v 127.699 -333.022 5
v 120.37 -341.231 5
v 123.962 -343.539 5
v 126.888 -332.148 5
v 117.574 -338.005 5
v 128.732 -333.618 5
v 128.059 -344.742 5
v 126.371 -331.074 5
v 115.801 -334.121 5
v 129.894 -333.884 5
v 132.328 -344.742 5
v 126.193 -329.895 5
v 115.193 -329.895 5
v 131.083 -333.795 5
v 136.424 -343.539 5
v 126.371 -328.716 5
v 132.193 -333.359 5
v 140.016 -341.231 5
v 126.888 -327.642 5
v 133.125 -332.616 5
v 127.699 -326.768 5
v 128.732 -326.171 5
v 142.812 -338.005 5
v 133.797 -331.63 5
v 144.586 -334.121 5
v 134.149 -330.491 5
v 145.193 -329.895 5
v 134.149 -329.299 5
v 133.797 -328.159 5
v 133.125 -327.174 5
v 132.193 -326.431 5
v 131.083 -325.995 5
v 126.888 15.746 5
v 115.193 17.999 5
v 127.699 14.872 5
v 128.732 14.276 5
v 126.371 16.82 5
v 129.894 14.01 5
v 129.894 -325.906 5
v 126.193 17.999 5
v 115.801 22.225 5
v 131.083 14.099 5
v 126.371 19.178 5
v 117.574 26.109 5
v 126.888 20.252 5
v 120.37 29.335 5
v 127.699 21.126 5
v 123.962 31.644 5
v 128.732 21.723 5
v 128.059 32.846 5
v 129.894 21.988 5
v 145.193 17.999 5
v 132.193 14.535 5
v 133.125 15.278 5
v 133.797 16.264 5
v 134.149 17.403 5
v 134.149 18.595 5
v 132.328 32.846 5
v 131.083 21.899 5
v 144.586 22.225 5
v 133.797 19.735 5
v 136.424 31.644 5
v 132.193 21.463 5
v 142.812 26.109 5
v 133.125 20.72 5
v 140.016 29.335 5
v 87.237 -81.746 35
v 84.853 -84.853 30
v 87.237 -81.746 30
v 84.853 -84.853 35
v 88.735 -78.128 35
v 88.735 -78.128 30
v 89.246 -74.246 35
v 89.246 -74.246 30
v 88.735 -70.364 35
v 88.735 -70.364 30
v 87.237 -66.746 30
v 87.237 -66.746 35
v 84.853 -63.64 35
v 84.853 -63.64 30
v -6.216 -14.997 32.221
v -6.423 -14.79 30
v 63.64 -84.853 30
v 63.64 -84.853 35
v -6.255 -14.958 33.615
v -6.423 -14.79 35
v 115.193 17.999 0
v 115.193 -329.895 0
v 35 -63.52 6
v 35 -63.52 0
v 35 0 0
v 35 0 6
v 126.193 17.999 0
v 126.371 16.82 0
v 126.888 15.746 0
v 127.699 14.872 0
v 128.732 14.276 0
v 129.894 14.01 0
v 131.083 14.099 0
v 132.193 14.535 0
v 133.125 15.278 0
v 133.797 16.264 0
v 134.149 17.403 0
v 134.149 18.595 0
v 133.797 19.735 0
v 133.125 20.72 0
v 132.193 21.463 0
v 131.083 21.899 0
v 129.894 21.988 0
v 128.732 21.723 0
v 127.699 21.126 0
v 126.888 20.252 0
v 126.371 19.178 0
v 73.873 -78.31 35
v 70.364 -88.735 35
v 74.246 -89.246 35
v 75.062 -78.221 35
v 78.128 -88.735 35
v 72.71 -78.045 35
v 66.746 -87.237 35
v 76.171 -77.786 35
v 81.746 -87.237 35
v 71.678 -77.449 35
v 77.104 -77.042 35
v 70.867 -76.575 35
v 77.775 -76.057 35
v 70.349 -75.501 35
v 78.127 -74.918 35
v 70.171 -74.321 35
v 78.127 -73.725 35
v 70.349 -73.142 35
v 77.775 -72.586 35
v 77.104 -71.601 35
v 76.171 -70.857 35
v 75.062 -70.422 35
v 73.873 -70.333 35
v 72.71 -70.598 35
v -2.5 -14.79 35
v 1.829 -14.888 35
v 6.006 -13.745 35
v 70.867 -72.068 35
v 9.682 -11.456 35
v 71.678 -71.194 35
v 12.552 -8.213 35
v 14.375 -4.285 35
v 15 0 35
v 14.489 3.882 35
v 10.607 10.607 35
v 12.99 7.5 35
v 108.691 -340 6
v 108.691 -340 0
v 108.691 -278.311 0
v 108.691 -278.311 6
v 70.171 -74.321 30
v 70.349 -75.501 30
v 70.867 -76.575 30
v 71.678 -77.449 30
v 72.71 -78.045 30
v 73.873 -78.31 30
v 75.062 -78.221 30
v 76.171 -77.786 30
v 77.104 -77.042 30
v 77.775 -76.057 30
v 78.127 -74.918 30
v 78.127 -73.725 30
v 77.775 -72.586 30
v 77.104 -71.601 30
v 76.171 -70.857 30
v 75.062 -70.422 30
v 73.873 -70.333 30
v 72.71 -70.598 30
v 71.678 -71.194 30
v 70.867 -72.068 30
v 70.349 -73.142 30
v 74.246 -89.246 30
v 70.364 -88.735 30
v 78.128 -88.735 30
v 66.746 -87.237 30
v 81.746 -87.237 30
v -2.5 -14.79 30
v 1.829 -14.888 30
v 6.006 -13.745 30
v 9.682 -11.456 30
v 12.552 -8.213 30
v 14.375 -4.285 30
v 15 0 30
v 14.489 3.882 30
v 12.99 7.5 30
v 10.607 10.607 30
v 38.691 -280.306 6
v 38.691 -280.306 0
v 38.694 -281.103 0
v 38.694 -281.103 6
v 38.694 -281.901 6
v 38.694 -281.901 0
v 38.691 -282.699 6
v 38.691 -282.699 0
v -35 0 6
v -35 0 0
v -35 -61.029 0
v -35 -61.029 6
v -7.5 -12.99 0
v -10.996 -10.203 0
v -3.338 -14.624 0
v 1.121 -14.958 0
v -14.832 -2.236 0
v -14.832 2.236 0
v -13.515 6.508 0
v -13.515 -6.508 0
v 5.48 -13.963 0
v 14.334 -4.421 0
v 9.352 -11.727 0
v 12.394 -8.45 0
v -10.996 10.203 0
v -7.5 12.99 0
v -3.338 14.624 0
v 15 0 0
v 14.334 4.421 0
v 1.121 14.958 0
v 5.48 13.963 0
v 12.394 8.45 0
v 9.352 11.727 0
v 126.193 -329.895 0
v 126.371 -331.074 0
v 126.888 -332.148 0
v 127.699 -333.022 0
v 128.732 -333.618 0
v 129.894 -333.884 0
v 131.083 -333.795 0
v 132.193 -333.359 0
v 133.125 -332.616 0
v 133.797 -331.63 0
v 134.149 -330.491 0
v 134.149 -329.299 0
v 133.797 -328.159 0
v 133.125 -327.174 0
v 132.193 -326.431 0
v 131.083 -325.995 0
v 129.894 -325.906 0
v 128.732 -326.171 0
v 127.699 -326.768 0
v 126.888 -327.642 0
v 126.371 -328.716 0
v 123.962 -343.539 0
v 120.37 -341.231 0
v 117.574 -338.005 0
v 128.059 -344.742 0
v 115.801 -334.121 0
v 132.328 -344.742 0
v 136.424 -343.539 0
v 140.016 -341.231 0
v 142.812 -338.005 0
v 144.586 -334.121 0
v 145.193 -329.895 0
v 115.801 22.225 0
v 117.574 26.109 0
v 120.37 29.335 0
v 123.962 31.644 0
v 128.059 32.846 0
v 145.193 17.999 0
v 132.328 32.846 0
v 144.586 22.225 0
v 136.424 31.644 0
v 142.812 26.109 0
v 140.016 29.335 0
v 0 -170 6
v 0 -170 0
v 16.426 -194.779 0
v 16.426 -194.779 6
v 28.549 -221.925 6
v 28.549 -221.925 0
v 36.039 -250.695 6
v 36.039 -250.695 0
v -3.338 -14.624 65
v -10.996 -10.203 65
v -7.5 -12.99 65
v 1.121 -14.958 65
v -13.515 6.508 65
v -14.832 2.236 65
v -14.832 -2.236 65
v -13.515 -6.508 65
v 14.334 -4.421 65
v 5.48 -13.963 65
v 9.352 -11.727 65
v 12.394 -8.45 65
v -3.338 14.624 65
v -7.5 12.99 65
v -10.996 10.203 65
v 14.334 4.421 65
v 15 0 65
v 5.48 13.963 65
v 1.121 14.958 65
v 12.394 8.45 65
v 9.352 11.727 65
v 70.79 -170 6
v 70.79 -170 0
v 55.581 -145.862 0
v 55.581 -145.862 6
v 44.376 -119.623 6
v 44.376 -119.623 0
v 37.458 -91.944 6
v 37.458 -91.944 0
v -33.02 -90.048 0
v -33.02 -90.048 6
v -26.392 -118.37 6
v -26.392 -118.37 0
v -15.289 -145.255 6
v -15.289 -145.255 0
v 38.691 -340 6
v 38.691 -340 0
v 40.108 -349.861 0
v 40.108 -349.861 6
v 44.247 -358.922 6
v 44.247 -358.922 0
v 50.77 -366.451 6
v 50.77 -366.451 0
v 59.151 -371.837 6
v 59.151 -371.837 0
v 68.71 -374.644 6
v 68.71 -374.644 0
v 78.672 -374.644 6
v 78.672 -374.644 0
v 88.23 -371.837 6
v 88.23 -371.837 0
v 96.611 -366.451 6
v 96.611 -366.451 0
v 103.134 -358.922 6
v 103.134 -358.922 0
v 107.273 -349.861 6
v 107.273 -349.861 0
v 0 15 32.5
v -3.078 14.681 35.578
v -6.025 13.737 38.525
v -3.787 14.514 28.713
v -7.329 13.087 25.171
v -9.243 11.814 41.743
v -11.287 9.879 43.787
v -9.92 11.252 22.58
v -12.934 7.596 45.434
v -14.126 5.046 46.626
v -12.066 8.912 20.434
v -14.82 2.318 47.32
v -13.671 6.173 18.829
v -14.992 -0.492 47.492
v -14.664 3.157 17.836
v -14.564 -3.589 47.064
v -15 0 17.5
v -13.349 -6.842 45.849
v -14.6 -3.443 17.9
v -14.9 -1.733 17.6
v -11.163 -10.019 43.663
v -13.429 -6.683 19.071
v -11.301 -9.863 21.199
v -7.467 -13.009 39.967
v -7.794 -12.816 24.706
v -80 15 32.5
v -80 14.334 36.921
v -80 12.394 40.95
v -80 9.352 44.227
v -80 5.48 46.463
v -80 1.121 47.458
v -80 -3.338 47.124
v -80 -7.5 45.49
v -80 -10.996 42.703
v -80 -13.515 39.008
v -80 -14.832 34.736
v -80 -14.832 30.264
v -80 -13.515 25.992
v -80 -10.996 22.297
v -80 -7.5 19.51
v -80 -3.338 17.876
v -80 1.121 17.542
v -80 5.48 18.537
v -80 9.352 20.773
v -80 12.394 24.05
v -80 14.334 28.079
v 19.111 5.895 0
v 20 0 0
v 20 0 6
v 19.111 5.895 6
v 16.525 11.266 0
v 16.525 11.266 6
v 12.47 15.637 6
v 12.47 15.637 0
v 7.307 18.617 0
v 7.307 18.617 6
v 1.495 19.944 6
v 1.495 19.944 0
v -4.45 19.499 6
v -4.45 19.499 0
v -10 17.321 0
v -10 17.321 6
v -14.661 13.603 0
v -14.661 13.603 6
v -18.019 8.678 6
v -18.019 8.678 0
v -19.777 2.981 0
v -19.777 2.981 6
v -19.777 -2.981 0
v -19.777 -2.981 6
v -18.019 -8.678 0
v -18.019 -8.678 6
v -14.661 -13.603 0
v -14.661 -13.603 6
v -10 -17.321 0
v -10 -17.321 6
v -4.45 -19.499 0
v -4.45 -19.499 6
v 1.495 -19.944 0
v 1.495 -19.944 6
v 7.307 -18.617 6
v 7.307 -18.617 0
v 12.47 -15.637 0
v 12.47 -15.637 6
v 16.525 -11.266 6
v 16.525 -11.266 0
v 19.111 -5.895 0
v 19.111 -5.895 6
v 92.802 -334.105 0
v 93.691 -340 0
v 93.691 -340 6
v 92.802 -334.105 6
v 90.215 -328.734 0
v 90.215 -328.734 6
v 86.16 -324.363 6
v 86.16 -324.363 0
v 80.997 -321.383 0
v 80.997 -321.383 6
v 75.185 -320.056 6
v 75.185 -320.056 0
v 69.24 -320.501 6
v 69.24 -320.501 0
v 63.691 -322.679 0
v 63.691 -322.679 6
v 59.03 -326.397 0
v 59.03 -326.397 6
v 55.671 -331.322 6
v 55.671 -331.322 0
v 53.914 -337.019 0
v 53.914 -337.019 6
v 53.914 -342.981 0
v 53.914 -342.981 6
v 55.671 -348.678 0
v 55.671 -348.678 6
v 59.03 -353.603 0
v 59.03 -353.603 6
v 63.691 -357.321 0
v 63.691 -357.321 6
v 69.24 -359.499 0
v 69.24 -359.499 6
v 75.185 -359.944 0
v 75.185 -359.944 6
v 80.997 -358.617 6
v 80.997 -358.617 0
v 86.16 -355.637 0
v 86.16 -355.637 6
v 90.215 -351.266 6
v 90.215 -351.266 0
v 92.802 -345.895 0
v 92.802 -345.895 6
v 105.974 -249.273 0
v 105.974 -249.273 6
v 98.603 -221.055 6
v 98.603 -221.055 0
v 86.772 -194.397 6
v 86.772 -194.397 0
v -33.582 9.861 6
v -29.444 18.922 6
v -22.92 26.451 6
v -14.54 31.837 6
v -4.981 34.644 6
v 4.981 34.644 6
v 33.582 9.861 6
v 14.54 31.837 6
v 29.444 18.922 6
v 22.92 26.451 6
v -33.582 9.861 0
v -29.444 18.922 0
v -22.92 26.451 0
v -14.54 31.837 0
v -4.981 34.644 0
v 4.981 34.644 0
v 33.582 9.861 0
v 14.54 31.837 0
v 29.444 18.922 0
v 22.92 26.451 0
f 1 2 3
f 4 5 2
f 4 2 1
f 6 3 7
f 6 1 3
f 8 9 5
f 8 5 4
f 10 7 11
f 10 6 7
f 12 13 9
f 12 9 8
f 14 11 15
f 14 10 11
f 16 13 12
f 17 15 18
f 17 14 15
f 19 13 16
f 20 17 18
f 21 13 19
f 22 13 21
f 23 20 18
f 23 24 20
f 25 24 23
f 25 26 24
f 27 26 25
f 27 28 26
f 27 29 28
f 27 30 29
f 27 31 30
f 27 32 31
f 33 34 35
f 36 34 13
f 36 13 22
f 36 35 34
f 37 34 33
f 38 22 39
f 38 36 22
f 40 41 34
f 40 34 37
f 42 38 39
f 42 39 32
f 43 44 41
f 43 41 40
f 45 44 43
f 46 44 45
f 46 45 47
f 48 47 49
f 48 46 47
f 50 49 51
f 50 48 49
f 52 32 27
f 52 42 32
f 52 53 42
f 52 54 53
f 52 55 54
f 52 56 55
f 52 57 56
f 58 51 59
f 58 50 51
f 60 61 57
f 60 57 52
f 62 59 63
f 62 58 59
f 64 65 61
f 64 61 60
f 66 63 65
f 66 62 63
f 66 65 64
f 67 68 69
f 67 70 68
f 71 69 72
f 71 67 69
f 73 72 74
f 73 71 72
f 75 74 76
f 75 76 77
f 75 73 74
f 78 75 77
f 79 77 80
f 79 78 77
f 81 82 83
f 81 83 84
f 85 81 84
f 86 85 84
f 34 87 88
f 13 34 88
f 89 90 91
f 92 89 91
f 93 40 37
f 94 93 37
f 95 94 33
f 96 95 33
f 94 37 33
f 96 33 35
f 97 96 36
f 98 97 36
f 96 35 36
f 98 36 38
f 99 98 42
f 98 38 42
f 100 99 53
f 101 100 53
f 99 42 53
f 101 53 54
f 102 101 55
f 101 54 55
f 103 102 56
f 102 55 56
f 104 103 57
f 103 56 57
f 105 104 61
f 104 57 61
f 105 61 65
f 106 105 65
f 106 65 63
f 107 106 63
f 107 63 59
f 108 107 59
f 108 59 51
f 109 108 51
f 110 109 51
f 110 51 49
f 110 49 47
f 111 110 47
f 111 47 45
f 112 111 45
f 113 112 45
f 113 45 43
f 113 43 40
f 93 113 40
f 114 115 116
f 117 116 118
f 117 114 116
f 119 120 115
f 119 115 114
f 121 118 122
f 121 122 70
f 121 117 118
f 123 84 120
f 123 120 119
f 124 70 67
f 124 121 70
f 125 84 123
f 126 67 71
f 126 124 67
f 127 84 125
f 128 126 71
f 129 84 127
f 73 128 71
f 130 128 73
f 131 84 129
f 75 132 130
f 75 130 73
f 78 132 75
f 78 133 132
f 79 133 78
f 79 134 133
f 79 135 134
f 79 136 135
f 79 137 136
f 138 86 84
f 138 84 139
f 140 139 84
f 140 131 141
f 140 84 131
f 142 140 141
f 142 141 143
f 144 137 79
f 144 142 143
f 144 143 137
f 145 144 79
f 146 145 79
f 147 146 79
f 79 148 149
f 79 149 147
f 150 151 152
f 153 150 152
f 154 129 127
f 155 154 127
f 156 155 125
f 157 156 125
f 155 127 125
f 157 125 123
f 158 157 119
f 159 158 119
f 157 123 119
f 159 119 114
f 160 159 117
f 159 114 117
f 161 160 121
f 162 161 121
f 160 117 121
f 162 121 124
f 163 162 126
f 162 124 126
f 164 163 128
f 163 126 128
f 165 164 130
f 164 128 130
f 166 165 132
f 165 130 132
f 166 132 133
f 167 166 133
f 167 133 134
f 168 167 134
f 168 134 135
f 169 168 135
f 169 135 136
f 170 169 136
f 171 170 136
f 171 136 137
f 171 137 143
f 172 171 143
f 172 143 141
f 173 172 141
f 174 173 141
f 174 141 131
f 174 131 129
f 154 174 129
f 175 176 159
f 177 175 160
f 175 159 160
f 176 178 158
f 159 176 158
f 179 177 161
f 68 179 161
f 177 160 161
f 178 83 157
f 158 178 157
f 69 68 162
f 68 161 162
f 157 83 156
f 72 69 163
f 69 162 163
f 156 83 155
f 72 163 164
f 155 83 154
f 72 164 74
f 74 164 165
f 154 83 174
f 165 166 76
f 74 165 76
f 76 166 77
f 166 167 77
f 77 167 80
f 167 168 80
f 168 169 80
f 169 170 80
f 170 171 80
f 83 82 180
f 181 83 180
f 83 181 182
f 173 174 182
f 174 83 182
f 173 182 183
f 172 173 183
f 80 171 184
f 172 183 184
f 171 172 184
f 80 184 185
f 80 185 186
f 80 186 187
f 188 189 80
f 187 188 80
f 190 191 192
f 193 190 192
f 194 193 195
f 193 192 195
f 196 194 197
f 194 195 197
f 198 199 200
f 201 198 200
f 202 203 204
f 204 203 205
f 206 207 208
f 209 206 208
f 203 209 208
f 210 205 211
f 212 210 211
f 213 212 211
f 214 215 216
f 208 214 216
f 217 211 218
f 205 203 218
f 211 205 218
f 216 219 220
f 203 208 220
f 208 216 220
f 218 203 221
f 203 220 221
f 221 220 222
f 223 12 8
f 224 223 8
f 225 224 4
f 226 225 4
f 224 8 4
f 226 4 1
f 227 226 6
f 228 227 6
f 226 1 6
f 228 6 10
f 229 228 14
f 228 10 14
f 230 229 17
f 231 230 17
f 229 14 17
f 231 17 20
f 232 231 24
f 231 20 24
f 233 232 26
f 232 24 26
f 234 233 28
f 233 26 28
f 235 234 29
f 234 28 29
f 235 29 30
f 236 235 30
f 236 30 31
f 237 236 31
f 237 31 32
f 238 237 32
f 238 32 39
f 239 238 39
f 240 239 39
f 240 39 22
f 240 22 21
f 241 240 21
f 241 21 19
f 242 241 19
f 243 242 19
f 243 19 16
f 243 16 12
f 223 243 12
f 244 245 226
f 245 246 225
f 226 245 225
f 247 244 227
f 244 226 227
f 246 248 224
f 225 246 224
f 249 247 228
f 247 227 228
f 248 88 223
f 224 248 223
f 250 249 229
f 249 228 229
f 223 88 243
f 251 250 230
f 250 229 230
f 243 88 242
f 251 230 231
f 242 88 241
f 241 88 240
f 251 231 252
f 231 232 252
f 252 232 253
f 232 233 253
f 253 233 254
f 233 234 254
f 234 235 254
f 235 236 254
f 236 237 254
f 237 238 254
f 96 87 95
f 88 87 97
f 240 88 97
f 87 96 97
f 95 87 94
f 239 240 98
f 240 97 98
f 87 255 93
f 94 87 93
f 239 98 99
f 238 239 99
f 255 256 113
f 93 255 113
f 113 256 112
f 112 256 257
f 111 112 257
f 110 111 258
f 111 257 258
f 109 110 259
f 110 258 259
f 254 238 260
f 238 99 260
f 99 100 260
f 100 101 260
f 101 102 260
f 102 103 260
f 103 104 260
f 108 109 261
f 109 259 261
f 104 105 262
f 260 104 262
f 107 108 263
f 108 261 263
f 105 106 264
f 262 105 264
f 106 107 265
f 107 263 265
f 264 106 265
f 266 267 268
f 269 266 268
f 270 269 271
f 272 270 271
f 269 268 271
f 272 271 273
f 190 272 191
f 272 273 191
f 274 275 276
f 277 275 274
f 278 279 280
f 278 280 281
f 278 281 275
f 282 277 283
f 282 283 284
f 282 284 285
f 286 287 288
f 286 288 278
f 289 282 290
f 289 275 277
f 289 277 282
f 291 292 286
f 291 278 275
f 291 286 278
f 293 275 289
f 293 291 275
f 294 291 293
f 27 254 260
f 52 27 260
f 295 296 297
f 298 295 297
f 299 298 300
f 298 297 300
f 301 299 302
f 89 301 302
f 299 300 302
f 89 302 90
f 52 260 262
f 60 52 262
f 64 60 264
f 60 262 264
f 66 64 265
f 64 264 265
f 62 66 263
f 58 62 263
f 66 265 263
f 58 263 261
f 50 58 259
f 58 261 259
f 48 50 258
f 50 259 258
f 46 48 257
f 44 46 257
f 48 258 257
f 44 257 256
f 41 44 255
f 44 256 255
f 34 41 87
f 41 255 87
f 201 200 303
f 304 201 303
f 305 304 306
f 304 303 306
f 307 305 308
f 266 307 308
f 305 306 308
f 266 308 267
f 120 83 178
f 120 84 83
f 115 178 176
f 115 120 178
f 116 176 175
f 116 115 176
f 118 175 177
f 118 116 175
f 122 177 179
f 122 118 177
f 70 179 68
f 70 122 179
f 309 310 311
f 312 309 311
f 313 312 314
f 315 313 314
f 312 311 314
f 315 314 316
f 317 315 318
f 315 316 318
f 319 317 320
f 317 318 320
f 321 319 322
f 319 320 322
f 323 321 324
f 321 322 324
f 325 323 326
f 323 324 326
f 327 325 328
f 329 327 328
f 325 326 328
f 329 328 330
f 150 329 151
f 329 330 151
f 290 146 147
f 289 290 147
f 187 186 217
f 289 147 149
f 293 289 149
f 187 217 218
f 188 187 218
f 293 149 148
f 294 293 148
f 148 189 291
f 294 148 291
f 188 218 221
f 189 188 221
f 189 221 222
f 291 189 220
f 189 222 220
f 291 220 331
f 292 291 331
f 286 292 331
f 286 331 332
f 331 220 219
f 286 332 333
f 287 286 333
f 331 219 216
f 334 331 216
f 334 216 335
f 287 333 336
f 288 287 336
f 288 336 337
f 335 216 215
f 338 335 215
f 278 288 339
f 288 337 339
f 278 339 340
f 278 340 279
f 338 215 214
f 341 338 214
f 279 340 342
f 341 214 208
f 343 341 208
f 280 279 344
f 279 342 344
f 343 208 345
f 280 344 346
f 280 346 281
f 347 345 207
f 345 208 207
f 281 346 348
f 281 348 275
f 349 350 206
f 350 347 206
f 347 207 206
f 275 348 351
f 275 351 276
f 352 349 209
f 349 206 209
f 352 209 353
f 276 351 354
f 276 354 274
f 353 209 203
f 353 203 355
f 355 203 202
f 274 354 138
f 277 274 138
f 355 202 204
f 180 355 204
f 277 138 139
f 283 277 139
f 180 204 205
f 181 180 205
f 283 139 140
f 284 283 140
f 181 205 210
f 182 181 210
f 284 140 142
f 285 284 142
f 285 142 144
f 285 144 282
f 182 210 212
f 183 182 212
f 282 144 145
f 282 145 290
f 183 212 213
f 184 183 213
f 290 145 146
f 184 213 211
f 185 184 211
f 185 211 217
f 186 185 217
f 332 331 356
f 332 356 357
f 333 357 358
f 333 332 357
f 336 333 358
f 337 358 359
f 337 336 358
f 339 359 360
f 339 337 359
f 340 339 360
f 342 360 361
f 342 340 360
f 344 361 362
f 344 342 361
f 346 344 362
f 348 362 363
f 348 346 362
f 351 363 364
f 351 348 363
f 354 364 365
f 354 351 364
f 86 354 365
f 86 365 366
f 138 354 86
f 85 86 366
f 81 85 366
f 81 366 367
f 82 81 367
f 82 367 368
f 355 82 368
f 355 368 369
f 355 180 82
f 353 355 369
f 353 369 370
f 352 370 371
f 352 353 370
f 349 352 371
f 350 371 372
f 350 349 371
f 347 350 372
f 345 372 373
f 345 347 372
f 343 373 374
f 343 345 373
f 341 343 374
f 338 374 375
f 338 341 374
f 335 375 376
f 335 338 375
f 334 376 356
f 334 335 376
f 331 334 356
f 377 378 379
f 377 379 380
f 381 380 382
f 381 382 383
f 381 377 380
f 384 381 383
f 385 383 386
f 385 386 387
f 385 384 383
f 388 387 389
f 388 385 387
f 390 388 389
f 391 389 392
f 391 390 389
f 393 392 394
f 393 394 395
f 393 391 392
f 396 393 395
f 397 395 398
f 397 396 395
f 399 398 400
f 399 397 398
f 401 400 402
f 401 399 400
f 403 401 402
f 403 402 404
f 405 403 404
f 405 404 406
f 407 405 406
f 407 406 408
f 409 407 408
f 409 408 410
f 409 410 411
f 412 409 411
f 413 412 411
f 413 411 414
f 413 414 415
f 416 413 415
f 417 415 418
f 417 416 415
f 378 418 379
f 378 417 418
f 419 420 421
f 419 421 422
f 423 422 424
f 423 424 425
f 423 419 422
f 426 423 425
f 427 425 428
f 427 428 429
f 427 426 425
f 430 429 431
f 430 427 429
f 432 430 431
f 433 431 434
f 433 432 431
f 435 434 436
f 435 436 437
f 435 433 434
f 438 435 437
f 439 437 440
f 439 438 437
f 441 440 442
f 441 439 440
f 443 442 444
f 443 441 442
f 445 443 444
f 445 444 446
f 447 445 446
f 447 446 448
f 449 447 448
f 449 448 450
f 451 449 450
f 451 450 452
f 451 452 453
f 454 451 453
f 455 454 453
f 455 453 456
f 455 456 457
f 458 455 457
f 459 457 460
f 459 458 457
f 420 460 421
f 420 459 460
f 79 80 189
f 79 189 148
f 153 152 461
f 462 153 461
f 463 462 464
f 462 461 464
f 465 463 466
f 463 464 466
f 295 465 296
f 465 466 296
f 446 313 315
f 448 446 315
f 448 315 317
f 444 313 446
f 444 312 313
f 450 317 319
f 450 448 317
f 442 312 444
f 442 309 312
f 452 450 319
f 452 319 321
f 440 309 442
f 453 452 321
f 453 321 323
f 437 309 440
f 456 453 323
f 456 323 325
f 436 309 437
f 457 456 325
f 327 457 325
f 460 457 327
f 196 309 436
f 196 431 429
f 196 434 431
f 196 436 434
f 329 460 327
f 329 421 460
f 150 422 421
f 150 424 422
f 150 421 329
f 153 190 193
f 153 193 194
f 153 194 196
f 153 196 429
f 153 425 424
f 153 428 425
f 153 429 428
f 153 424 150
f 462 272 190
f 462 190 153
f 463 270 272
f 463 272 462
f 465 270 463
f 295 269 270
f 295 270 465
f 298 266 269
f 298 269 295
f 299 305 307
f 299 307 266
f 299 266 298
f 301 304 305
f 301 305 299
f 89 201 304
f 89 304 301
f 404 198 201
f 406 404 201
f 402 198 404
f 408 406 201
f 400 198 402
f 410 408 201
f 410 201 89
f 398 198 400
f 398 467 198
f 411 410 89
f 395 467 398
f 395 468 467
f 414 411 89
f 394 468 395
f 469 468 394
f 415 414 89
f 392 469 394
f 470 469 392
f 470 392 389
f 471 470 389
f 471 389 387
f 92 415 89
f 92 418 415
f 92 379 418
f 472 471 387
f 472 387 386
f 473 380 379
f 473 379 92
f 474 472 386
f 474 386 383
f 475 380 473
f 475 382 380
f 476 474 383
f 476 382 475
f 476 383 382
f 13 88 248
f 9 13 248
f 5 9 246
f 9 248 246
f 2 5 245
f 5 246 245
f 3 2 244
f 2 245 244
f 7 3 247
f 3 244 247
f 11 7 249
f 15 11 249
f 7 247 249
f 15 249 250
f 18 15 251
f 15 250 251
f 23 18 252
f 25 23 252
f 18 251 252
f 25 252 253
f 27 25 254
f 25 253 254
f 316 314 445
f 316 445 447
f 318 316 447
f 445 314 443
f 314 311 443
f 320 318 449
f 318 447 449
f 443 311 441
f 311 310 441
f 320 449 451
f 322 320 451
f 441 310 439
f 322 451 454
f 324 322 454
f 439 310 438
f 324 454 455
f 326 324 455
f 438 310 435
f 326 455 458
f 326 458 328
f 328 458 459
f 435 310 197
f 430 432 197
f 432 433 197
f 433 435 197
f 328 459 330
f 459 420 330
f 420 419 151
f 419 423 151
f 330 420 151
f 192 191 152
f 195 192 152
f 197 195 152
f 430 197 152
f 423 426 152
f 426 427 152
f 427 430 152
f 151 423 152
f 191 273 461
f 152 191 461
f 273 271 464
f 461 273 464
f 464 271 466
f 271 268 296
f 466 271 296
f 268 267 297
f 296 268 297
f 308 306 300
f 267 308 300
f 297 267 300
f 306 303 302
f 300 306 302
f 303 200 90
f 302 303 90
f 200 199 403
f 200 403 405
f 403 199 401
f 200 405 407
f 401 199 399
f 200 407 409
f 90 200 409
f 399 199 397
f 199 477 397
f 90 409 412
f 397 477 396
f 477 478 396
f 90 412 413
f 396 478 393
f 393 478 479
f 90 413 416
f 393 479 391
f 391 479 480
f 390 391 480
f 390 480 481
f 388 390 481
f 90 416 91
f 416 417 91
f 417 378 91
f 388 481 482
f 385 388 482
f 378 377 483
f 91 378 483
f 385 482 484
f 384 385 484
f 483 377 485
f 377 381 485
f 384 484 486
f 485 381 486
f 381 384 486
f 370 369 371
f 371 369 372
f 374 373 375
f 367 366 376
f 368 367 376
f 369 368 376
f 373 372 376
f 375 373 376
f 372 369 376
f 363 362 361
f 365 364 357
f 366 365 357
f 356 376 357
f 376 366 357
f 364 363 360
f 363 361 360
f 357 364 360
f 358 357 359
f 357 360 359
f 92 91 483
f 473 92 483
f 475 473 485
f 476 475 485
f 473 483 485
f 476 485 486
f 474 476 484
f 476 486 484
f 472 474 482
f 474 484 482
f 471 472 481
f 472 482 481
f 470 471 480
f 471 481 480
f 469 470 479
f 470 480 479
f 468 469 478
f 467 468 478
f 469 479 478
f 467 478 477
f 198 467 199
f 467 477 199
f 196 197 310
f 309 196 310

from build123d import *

# Parameters (mm, degrees)
F0_R      = 20
F1_DEPTH  = 6
F2_R      = 15
F3_DEPTH  = 65
F4_R      = 15
F5_DEPTH  = 80
F7_W      = 30
F7_H      = 5
F8_DEPTH  = 120
F10_D     = 8
F11_R     = 14.99999
F13_DEPTH = 5
F14_D     = 8


# Not quite as in the source:
# - a fillet or chamfer is up to 0.001 mm smaller than in the source, because OpenCascade refuses the exact size


with BuildPart() as f1:
    # F0 (on Top) → F1 (new body)
    with BuildSketch(Plane.XY):
        with BuildLine():
            Line((-35, 0), (-35, -61.0286490145))
            ThreePointArc((-35, -61.0286490145), (-26.3919474837, -118.3702876491), (0, -170))
            ThreePointArc((0, -170), (28.5488738406, -221.9245845611), (38.6905676698, -280.3056322195))
            ThreePointArc((38.6905676698, -280.3056322195), (38.6945456991, -281.5023254682), (38.6905676698, -282.6990187168))
            Line((38.6905676698, -282.6990187168), (38.6905676698, -340))
            ThreePointArc((38.6905676698, -340), (73.6905676698, -375), (108.6905676698, -340))
            Line((108.6905676698, -340), (108.6905676698, -282.6990187168))
            Line((108.6905676698, -282.6990187168), (108.6905676698, -278.31146671))
            ThreePointArc((108.6905676698, -278.31146671), (98.6028154032, -221.0546666233), (70.7904994631, -170))
            ThreePointArc((70.7904994631, -170), (44.3760227078, -119.6233145812), (35, -63.5196140416))
            Line((35, -63.5196140416), (35, 0))
            ThreePointArc((35, 0), (0, 35), (-35, 0))
        make_face()
        with Locations((73.6905676698, -340)):
            Circle(F0_R, mode=Mode.SUBTRACT)
        Circle(F0_R, mode=Mode.SUBTRACT)
    extrude(amount=F1_DEPTH)


with BuildPart() as f3:
    # F2 (on Top) → F3 (new body)
    with BuildSketch(Plane.XY):
        Circle(F2_R)
    extrude(amount=F3_DEPTH)

    # F4 (on Right) → F5 (join)
    with BuildSketch(Plane.YZ):
        with Locations((0, 32.5)):
            Circle(F4_R)
    extrude(amount=-F5_DEPTH)

    # F7 (on face) → F8 (join)
    with BuildSketch(Plane(origin=(0, 0, 0), x_dir=(0.7071067812, 0.7071067812, 0), z_dir=(0.7071067812, -0.7071067812, 0))):
        with Locations((0, 32.5)):
            Rectangle(F7_W, F7_H)
    extrude(amount=F8_DEPTH)

    # F10 (through all)
    with Locations(Plane(origin=(0, 0, 0), x_dir=(1, 0, 0), z_dir=(0, 0, -1))):
        with Locations((74.1714673688, 74.321487157)):
            Hole(F10_D / 2)

    # F11 (radius 15 in the source; OpenCascade refuses exactly that, so slightly less here)
    f11_edges = [f3.edges().sort_by_distance(p)[0] for p in [
        (95.459415, -74.246212, 32.5),
        (74.246212, -95.459415, 32.5),
    ]]
    fillet(f11_edges, radius=F11_R)


with BuildPart() as f13:
    # F12 (on Top) → F13 (new body)
    with BuildSketch(Plane.XY):
        with BuildLine():
            ThreePointArc((130.1932446659, 32.9991710233), (119.5866429481, 28.6057727411), (115.1932446659, 17.9991710233))
            Line((115.1932446659, 17.9991710233), (115.1932446659, -329.8949189767))
            ThreePointArc((115.1932446659, -329.8949189767), (119.5866429481, -340.5015206945), (130.1932446659, -344.8949189767))
            ThreePointArc((130.1932446659, -344.8949189767), (140.7998463837, -340.5015206945), (145.1932446659, -329.8949189767))
            Line((145.1932446659, -329.8949189767), (145.1932446659, 17.9991710233))
            ThreePointArc((145.1932446659, 17.9991710233), (140.7998463837, 28.6057727411), (130.1932446659, 32.9991710233))
        make_face()
    extrude(amount=F13_DEPTH)

    # F14 (through all)
    with Locations(Plane(origin=(0, 0, 0), x_dir=(1, 0, 0), z_dir=(0, 0, -1))):
        with Locations((130.1932446659, 329.8949189767), (130.1932446659, -17.9991710233)):
            Hole(F14_D / 2)


solid = Compound([f1.part, f3.part, f13.part])
